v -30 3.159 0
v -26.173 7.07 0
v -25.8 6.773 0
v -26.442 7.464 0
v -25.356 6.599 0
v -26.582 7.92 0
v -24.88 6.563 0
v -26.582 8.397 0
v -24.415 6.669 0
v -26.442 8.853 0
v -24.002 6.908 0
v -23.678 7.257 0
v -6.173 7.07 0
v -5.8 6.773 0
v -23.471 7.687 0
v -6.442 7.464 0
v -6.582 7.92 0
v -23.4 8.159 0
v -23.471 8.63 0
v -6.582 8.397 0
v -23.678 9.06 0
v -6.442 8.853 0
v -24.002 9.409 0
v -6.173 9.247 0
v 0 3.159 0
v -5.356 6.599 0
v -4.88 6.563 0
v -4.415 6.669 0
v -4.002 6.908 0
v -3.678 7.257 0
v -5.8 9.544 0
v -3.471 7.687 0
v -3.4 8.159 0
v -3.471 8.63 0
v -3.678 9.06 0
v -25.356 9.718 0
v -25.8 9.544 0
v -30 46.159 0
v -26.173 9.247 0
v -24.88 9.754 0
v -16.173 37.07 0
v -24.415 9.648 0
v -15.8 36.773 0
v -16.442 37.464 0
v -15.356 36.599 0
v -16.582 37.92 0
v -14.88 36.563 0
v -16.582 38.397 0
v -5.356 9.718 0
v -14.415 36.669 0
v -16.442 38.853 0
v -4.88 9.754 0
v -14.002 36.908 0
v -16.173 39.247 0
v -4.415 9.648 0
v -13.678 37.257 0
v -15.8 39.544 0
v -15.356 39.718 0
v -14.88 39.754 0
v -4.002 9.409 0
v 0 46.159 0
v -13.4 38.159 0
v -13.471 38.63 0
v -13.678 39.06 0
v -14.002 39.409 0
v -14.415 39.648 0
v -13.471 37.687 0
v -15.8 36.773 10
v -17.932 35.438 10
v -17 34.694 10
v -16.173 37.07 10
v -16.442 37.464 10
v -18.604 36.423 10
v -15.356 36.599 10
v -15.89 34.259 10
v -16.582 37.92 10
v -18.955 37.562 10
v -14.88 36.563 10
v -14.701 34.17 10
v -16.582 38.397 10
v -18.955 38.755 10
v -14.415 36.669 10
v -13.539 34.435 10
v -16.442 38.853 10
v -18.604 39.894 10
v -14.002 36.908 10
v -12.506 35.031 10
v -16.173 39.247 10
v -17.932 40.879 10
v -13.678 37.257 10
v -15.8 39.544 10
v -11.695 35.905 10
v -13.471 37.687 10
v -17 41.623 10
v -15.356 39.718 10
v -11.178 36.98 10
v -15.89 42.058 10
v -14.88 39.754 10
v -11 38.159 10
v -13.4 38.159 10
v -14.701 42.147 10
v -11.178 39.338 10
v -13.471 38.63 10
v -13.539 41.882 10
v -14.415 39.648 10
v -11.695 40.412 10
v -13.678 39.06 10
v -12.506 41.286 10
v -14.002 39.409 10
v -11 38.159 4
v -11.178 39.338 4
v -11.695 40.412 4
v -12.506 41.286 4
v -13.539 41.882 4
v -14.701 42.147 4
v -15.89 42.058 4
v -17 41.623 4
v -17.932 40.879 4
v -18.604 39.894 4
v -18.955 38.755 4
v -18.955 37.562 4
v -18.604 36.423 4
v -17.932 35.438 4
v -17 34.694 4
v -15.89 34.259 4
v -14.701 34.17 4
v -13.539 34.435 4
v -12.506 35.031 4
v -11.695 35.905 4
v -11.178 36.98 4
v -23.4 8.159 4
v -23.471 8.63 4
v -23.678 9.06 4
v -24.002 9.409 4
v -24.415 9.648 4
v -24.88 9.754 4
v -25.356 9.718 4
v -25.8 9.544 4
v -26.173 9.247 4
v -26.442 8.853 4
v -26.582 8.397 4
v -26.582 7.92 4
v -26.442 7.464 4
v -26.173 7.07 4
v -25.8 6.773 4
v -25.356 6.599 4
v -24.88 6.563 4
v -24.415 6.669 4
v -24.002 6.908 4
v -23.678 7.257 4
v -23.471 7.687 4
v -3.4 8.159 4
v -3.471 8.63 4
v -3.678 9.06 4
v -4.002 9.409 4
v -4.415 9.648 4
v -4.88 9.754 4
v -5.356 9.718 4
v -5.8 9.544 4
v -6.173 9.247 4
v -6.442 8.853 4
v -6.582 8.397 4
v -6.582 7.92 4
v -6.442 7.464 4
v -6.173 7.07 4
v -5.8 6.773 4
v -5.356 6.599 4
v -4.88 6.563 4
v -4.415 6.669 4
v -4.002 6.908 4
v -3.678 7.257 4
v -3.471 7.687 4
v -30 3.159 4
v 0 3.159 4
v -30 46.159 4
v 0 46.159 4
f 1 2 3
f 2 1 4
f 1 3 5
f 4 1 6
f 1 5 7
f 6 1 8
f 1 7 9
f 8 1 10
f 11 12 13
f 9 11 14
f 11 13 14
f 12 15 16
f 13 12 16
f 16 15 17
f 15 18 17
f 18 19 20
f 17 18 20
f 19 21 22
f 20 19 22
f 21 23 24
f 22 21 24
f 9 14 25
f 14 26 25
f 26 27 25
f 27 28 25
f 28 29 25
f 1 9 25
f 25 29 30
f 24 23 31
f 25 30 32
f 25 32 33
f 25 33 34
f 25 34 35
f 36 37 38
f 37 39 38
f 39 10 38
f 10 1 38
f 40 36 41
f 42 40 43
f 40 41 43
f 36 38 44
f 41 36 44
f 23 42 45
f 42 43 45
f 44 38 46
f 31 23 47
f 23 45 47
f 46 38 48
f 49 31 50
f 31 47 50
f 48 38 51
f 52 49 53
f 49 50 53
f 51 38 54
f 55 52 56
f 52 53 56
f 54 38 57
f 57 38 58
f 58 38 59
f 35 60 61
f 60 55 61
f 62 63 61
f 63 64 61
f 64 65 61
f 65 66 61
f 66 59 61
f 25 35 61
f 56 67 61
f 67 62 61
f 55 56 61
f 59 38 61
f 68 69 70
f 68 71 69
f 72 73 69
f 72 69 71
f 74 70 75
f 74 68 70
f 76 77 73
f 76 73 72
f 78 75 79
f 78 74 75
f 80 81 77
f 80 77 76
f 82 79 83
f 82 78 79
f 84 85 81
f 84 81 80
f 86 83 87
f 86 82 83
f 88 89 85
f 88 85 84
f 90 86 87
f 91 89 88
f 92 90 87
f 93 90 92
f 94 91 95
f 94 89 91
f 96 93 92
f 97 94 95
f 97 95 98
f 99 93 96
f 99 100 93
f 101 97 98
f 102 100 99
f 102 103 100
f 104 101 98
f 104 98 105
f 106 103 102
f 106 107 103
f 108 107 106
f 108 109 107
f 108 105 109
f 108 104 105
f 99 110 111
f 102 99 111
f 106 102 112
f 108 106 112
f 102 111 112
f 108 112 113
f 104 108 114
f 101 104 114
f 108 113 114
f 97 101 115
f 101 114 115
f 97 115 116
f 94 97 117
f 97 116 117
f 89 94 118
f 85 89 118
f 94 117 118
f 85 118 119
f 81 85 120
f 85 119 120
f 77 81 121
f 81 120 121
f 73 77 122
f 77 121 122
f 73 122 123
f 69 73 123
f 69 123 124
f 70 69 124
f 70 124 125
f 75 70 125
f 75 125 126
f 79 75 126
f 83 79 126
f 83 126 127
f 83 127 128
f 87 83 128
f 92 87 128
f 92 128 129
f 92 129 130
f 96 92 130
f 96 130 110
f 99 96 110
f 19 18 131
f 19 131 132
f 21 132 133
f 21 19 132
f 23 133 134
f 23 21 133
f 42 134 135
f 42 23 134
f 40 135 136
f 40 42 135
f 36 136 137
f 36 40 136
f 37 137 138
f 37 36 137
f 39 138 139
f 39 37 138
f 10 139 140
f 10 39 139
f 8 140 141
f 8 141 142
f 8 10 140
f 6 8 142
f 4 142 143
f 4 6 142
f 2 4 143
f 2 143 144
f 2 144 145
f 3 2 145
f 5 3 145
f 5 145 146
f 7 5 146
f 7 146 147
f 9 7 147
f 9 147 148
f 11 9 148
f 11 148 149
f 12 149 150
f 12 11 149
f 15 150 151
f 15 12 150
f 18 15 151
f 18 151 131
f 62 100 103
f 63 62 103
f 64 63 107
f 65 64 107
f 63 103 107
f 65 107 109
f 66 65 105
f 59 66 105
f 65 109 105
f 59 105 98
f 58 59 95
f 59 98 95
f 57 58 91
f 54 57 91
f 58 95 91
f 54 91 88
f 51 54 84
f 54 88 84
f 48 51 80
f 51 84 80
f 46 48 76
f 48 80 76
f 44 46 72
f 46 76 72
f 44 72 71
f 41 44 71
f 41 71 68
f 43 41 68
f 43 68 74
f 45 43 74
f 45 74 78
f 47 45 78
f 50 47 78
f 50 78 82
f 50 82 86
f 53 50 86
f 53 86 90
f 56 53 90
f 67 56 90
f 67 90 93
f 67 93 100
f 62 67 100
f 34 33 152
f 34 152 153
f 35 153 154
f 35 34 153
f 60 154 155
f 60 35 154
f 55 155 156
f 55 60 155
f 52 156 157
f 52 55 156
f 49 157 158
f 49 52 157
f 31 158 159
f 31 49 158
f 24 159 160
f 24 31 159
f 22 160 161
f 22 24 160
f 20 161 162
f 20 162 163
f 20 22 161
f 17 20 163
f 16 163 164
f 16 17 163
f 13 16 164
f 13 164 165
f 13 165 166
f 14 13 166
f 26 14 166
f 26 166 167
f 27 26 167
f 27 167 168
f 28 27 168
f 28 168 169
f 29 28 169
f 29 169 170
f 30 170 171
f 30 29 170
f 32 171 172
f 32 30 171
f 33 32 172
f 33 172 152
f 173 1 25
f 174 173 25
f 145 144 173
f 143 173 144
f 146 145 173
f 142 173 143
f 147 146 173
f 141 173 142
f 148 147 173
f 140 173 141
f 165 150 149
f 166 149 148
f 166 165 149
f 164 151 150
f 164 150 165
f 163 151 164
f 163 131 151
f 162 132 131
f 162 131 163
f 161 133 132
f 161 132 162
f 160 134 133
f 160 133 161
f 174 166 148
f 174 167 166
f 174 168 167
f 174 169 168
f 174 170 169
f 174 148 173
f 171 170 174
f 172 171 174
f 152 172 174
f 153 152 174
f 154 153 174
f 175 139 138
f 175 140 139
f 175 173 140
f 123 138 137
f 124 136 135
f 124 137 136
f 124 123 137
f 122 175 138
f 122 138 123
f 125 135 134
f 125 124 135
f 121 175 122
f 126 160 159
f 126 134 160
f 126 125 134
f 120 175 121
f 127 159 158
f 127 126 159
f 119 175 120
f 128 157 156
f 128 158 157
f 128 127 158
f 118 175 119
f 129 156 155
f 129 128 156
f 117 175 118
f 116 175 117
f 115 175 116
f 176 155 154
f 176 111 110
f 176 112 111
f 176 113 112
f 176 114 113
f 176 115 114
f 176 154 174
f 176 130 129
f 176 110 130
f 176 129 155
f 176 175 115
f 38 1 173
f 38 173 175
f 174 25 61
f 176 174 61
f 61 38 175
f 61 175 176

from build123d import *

# Parameters (mm, degrees)
SKETCH_1_W          = 30
SKETCH_1_H          = 43
SKETCH_1_R          = 1.6
SKETCH_1_R_2        = 4
EXTRUDE_1_DEPTH     = 4
EXTRUDE_START       = -4
SKETCH_2_R          = 4
EXTRUDE_2_DEPTH     = 10
SKETCH_3_R          = 1.6
CUT_EXTRUDE_1_DEPTH = 11


with BuildPart() as part:
    # 草图1 → 凸台-拉伸1 (new body)
    with BuildSketch(Plane.XY):
        with Locations((-15, 24.658548848)):
            Rectangle(SKETCH_1_W, SKETCH_1_H)
        with Locations((-5, 8.158548848)):
            Circle(SKETCH_1_R, mode=Mode.SUBTRACT)
        with Locations((-25, 8.158548848)):
            Circle(SKETCH_1_R, mode=Mode.SUBTRACT)
        with Locations((-15, 38.158548848)):
            Circle(SKETCH_1_R_2, mode=Mode.SUBTRACT)
    extrude(amount=EXTRUDE_1_DEPTH)

    # 草图2 → 凸台-拉伸2 (add)
    with BuildSketch(Plane.XY.offset(4).offset(EXTRUDE_START)):
        with Locations((-15, 38.158548848)):
            Circle(SKETCH_2_R)
    extrude(amount=EXTRUDE_2_DEPTH)

    # 草图3 → 切除-拉伸1 (cut, through all)
    with BuildSketch(Plane.XY.offset(10)):
        with Locations((-15, 38.158548848)):
            Circle(SKETCH_3_R)
    extrude(amount=-CUT_EXTRUDE_1_DEPTH, mode=Mode.SUBTRACT)


solid = part.part
